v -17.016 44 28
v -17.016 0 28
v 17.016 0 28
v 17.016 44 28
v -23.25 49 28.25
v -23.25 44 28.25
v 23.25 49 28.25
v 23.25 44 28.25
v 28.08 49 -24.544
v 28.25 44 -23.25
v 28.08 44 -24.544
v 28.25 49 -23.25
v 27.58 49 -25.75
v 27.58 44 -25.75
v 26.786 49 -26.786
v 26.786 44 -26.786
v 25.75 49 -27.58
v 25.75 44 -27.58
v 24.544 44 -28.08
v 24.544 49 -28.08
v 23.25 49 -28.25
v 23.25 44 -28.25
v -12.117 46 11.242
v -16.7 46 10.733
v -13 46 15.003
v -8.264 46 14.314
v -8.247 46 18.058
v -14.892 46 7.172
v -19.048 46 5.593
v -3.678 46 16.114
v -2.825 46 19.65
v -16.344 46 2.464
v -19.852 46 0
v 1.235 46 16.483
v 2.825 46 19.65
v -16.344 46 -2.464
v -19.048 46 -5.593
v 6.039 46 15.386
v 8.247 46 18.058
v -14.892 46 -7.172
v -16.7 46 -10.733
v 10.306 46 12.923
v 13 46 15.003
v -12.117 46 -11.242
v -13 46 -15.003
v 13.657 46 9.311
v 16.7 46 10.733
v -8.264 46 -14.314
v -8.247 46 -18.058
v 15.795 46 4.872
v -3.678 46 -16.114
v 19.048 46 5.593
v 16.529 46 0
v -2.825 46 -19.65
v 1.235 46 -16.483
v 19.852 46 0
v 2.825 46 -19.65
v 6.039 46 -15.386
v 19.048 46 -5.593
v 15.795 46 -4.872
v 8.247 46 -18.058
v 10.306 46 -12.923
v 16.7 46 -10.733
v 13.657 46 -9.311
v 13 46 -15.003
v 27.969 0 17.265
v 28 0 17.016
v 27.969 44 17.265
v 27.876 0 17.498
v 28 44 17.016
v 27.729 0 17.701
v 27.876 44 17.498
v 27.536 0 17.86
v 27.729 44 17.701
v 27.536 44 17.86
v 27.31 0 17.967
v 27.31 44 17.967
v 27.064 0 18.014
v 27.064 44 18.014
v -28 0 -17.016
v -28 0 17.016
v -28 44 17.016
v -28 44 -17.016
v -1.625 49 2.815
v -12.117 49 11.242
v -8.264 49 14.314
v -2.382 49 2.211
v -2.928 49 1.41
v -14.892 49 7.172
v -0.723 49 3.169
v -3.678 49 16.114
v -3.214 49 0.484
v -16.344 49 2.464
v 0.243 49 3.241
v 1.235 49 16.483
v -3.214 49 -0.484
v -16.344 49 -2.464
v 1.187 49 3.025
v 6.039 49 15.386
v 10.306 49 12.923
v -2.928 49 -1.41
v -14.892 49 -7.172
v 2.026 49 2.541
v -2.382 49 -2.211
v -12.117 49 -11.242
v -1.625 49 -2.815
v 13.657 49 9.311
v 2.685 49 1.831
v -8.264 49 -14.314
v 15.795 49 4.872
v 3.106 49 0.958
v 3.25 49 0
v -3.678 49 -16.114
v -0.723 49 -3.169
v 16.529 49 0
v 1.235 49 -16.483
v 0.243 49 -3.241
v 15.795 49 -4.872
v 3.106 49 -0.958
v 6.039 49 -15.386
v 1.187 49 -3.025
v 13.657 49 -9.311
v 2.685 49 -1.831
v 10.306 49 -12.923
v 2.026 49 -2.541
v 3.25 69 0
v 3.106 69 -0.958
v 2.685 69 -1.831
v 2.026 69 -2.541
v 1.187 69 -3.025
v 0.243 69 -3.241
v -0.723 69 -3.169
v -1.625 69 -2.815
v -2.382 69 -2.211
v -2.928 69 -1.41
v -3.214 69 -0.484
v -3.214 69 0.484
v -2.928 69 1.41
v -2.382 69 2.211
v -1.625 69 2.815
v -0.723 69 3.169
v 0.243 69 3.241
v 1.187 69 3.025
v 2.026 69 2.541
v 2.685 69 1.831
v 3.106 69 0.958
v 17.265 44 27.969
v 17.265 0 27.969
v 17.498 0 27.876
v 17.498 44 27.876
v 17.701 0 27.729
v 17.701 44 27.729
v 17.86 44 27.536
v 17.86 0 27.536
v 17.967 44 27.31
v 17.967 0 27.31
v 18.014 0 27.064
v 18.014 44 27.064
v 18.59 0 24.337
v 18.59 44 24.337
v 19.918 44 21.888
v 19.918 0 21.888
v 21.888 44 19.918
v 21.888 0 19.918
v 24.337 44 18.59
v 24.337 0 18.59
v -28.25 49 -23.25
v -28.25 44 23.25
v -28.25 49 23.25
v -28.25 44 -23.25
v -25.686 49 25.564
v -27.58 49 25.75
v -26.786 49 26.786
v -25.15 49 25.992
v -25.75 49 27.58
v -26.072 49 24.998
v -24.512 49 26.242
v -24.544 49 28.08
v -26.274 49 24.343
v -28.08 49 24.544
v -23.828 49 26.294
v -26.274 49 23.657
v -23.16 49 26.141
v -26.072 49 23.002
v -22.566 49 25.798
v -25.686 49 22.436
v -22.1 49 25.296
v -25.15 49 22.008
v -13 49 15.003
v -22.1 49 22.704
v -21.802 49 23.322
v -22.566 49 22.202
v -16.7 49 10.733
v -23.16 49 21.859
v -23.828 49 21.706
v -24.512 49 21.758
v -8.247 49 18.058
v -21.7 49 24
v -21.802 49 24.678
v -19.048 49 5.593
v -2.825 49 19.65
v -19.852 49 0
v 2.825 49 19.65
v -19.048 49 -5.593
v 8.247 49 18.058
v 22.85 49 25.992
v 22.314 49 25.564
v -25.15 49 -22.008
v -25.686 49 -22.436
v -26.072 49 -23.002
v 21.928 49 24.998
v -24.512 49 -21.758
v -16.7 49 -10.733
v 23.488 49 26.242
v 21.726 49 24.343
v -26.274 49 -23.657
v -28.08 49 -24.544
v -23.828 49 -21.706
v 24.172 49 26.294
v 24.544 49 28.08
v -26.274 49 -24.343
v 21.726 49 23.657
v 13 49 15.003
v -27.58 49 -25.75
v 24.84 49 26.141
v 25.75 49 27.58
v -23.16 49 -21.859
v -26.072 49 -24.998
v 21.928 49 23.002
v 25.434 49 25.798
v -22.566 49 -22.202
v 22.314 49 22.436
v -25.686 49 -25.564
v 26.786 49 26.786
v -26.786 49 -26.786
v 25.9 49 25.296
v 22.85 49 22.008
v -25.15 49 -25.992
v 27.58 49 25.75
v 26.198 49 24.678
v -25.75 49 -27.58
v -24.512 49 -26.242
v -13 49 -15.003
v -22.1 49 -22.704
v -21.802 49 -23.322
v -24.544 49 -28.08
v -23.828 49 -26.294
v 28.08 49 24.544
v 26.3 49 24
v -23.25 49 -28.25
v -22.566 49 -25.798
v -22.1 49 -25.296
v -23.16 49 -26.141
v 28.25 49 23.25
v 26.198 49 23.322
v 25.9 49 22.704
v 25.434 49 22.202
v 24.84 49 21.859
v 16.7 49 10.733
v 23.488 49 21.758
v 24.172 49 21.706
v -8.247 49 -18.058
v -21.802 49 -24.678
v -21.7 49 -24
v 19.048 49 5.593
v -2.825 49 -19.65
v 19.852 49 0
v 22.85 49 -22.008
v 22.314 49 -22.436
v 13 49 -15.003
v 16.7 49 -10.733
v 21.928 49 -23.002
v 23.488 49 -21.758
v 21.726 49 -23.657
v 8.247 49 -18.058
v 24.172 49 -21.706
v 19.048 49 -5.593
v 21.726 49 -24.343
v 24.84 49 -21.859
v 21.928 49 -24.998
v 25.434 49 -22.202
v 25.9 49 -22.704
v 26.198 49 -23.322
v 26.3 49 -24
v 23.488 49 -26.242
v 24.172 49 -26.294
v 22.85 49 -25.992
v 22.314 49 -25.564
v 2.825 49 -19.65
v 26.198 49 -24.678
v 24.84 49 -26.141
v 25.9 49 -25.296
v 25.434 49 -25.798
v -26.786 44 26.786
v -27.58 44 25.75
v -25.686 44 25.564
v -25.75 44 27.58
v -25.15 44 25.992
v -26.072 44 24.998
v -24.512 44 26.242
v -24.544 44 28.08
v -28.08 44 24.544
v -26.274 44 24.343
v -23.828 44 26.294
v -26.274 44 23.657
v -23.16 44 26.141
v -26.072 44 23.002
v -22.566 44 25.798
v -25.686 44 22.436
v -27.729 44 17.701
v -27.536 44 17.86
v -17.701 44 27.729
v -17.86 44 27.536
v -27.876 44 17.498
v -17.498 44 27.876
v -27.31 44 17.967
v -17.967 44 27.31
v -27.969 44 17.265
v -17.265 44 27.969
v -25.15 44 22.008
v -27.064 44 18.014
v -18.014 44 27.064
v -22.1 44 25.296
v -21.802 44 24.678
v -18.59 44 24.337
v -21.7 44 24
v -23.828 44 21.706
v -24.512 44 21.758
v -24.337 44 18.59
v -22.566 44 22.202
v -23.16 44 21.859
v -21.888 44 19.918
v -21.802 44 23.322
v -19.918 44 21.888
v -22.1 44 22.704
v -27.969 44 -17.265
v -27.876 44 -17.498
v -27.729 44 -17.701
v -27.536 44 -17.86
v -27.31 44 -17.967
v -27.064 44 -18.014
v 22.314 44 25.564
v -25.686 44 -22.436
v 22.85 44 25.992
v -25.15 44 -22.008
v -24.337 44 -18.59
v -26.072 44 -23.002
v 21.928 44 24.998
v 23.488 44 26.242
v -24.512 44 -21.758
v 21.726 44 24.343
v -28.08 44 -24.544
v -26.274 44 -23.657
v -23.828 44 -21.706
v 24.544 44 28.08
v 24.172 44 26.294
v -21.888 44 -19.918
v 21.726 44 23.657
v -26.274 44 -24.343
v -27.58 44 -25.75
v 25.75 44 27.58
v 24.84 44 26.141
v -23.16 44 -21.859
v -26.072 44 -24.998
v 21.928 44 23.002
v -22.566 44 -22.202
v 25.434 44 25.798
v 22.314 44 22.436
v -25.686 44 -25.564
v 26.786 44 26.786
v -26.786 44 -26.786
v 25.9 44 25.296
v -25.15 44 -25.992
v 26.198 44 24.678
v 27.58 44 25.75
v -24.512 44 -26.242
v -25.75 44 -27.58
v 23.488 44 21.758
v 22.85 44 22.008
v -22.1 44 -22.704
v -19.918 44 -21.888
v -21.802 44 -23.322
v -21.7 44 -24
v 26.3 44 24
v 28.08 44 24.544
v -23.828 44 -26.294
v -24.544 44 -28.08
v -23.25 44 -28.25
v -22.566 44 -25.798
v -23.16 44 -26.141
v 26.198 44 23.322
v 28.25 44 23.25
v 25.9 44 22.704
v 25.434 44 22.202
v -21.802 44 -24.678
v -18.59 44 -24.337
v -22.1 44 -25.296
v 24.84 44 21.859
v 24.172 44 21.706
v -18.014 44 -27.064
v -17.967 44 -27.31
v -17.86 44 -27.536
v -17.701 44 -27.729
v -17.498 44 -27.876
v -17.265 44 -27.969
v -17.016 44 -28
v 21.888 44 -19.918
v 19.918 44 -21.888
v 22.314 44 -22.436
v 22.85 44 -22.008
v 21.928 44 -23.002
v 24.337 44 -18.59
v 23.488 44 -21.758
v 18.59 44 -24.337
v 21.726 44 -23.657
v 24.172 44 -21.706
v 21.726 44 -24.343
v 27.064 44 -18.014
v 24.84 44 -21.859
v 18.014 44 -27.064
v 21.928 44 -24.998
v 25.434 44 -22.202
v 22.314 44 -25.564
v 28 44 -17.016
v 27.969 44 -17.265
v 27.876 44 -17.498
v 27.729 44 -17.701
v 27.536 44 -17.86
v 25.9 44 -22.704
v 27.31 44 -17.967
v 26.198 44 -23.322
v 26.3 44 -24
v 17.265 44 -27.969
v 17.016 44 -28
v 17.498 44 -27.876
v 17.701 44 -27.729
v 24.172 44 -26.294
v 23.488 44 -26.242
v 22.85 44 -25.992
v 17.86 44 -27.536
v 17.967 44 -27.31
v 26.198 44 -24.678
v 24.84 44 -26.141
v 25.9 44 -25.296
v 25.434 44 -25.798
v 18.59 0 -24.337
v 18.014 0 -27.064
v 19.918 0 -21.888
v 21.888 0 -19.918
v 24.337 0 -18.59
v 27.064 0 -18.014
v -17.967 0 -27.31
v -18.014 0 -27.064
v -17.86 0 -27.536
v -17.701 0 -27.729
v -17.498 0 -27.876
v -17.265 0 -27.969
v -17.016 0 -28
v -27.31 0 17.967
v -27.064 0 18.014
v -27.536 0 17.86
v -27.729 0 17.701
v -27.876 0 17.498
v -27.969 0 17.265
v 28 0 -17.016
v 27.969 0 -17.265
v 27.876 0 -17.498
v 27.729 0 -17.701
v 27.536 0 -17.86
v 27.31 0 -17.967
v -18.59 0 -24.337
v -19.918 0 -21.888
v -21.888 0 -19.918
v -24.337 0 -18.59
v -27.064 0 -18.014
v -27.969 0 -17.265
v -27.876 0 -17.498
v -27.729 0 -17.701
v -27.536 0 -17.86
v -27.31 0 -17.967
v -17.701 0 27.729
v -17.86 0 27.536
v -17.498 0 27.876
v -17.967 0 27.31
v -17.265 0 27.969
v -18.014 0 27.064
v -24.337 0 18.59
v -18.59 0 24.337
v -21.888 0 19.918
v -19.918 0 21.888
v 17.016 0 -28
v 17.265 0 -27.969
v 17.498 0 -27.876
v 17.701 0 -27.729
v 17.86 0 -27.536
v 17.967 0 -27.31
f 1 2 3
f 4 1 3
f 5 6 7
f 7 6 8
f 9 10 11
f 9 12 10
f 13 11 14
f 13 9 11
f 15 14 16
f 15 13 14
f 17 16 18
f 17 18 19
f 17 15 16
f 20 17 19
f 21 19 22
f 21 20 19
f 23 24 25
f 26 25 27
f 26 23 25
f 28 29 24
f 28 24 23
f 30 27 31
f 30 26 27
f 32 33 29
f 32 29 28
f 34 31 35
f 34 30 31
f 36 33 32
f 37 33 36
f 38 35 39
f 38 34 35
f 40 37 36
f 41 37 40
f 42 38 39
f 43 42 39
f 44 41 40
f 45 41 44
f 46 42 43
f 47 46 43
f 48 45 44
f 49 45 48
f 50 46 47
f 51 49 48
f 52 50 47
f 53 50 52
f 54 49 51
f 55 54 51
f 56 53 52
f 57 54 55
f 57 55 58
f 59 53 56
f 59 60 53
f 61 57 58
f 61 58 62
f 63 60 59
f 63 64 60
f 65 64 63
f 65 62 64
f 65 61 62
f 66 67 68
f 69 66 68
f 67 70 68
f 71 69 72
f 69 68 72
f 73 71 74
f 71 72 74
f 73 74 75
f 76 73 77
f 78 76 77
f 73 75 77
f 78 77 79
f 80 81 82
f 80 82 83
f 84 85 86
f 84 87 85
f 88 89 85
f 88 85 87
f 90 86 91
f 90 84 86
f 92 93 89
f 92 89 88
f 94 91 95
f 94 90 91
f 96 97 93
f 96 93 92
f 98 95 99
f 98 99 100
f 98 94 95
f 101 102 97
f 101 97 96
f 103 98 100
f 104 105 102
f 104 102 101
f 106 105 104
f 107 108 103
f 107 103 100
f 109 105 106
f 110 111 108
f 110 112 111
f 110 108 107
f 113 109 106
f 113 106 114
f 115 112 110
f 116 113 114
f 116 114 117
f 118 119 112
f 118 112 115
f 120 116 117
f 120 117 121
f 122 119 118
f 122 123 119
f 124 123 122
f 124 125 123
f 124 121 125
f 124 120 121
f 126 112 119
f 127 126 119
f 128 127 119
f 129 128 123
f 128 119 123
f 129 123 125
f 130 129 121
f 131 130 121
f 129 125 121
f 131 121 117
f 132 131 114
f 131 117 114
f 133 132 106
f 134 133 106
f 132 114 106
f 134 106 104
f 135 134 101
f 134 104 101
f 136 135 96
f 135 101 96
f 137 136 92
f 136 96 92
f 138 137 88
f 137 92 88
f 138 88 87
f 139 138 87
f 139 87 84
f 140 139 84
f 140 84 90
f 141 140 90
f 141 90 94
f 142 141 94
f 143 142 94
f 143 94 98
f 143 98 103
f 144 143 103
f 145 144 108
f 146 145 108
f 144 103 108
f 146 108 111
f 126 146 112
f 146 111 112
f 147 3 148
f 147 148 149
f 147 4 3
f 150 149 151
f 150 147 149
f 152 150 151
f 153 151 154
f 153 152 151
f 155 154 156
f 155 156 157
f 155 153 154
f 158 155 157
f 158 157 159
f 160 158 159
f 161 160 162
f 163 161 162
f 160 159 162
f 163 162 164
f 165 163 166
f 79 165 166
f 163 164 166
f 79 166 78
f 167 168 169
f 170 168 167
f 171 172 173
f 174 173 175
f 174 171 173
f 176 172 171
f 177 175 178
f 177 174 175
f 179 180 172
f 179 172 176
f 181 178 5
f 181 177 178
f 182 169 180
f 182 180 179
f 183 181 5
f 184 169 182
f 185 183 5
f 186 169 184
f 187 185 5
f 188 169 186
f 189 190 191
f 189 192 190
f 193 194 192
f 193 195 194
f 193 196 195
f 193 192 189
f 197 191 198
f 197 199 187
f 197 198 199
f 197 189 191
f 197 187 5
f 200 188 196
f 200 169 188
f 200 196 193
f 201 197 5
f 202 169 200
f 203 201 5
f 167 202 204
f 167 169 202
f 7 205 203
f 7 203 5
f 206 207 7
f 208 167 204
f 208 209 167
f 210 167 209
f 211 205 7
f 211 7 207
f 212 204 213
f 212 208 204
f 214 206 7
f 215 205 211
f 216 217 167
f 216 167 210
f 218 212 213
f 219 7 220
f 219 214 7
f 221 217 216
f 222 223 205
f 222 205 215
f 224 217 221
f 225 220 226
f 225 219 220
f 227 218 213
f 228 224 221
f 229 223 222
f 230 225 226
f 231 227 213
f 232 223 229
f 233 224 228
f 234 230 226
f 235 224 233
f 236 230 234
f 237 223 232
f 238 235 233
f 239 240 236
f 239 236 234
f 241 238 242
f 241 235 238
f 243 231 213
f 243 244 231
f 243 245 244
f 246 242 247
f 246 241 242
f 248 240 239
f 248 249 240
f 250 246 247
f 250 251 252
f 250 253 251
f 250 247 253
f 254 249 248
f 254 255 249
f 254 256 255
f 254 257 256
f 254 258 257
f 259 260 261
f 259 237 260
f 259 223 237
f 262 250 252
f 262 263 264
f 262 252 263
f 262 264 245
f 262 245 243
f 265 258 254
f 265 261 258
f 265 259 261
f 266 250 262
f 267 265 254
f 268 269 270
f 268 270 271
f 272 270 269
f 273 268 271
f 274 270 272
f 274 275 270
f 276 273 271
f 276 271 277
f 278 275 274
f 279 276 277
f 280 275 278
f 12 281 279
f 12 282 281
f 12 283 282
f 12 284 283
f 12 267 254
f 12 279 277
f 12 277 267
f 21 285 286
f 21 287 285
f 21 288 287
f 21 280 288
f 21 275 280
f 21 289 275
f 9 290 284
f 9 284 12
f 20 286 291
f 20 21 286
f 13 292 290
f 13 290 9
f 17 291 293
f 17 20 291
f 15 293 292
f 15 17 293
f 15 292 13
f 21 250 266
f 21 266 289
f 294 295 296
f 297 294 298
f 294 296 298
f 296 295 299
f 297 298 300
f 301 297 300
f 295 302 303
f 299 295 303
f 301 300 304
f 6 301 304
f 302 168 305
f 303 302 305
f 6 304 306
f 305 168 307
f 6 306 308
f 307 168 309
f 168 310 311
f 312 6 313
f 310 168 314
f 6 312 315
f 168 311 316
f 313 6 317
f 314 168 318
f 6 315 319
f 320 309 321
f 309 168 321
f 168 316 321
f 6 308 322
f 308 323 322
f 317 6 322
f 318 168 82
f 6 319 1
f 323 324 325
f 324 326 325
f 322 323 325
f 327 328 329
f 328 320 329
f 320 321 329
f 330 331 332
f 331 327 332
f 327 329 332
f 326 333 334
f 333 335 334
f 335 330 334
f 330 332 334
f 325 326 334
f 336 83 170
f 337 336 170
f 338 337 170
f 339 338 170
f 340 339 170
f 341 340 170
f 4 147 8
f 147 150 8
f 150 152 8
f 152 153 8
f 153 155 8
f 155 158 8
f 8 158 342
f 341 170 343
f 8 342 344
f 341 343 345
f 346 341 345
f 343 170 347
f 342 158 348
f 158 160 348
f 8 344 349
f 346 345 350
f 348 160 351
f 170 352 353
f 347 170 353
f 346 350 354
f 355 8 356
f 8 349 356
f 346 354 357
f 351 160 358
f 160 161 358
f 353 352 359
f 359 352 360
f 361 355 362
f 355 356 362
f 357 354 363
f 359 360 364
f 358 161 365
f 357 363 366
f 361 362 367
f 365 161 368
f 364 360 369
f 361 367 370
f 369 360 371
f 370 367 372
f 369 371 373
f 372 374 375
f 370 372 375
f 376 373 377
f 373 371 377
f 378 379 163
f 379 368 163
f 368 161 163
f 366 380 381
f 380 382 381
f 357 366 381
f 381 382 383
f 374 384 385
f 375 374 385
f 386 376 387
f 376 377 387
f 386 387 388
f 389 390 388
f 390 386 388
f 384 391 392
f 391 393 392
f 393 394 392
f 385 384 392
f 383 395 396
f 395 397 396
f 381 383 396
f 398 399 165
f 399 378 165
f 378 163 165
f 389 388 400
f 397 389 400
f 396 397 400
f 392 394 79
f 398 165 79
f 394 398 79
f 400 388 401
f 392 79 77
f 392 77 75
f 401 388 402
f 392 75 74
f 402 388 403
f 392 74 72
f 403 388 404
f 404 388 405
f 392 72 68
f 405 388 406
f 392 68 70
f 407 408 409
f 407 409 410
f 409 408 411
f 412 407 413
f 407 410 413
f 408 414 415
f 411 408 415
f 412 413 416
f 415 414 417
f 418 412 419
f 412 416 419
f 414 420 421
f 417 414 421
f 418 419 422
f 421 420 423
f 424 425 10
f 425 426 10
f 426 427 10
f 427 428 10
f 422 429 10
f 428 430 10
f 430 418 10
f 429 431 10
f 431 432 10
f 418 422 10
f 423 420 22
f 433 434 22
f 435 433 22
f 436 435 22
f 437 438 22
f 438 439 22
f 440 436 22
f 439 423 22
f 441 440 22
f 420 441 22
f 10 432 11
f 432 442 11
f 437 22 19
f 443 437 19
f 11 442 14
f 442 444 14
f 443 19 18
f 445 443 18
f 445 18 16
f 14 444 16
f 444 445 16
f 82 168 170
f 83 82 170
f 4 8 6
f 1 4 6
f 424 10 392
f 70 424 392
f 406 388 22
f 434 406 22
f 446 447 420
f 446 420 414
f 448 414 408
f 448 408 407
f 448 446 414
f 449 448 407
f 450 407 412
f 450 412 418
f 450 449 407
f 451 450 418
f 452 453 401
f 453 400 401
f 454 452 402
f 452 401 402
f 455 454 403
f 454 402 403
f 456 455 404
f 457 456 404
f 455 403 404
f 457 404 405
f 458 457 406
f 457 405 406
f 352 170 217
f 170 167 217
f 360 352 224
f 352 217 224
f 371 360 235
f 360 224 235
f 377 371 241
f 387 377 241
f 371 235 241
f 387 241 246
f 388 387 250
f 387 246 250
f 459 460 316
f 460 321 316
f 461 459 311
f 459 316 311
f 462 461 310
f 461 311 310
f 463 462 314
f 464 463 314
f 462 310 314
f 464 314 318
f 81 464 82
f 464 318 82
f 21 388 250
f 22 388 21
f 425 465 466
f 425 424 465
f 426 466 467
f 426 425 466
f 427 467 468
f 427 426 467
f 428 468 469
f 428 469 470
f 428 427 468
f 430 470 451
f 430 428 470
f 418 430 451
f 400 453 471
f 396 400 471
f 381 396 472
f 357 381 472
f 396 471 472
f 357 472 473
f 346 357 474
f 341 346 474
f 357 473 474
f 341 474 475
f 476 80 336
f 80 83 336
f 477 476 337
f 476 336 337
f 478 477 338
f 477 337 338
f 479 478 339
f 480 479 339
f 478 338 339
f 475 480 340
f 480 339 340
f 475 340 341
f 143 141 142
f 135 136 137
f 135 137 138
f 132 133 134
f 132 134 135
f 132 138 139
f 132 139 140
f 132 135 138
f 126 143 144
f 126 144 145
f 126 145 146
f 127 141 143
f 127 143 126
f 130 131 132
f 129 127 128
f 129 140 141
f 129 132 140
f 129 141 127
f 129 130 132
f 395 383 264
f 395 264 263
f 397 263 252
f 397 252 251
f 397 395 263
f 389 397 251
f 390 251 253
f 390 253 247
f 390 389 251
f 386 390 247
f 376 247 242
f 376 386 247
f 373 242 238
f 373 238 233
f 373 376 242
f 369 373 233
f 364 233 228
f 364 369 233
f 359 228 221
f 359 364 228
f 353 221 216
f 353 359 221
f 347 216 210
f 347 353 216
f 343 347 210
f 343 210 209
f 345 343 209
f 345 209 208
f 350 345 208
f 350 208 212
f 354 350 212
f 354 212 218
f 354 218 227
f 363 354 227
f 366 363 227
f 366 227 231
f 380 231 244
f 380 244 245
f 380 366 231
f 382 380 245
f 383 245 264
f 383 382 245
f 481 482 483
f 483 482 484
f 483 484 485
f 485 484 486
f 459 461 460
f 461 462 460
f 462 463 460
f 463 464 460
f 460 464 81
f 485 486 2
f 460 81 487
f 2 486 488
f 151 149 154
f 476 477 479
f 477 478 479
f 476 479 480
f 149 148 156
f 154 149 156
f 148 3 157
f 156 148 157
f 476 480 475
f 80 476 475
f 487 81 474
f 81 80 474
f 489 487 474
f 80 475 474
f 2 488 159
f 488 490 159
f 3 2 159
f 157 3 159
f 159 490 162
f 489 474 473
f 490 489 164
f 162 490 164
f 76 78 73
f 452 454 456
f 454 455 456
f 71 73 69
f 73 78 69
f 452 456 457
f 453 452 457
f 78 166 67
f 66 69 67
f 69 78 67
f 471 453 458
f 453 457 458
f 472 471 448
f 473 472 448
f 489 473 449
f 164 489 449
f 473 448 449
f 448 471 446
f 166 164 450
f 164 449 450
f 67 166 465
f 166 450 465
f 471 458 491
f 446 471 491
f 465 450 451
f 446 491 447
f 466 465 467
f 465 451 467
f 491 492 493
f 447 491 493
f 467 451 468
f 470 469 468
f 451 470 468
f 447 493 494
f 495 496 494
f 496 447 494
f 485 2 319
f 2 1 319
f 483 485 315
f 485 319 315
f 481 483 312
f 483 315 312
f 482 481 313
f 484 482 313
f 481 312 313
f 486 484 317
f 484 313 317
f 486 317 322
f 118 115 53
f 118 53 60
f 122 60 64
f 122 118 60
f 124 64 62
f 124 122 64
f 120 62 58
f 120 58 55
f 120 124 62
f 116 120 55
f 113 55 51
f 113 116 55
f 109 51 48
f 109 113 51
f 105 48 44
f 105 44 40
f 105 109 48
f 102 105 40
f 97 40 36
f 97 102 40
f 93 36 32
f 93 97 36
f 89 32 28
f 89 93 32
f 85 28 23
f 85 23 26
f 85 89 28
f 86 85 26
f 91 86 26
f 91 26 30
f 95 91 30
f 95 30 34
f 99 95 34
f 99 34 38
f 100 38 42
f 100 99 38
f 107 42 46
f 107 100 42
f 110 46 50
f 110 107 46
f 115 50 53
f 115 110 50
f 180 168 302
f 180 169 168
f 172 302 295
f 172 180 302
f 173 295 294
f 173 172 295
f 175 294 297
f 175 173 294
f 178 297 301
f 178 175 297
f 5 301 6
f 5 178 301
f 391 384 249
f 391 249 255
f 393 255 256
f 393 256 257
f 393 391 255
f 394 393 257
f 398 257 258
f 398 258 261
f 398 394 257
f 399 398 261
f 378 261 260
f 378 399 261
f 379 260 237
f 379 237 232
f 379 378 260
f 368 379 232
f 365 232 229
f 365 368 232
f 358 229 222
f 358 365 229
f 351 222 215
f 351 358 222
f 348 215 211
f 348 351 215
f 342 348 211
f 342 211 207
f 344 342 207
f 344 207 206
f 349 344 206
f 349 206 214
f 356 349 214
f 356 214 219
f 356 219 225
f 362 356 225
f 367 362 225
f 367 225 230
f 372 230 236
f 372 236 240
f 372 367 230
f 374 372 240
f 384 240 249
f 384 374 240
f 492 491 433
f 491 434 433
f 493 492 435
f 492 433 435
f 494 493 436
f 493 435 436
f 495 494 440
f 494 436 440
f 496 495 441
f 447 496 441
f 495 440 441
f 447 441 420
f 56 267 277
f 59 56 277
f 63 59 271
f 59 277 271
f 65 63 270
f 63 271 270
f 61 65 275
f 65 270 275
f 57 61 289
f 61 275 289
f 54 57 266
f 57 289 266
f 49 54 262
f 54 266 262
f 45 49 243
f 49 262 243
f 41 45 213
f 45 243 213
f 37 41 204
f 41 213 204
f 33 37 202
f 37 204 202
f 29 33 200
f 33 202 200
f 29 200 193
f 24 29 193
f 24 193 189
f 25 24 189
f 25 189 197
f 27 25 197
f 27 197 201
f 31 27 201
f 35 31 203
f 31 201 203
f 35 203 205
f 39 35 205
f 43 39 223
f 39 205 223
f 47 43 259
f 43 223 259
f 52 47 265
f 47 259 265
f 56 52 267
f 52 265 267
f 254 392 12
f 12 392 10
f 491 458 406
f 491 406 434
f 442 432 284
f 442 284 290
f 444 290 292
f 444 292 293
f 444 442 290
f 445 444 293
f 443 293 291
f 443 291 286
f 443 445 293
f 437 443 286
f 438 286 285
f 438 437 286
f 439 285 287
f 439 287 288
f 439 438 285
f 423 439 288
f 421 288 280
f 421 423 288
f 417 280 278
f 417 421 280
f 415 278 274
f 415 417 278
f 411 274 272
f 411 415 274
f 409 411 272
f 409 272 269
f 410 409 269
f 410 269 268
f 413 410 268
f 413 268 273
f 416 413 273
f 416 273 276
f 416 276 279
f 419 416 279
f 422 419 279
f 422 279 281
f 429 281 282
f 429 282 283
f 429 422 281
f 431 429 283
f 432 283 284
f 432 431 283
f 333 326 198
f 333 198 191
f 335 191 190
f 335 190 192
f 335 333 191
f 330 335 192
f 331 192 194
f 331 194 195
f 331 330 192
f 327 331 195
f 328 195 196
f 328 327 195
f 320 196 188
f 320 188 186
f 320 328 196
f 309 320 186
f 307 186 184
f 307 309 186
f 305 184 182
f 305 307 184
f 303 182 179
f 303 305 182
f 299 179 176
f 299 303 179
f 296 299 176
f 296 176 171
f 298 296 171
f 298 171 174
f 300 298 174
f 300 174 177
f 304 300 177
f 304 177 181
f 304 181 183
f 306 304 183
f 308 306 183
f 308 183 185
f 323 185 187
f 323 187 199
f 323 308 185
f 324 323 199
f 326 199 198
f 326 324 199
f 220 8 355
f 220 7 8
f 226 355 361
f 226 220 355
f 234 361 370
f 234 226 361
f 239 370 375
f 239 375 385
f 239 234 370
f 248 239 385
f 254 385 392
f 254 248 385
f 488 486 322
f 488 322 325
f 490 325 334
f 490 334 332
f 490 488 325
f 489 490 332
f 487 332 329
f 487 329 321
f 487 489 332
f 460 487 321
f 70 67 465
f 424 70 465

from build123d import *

# Parameters (mm, degrees)
SKETCH1_W                                = 56
SKETCH1_H                                = 56
BOSS_EXTRUDE1_DEPTH                      = 44
SKETCH2_W                                = 56.5
SKETCH2_H                                = 56.5
SKETCH2_R                                = 2.3
BOSS_EXTRUDE2_DEPTH                      = 5
SKETCH3_R                                = 19.851731711
SKETCH3_R_2                              = 16.528882373
CUT_EXTRUDE1_DEPTH                       = 3
SKETCH4_R                                = 3.25
BOSS_EXTRUDE3_DEPTH                      = 20
CUT_EXTRUDE2_DEPTH                       = 44
MIRROR1_AT_THE_SECOND_PLANE_COPY_1_DEPTH = 44
FILLET3_R                                = 1
FILLET2_R                                = 5


with BuildPart() as part:
    # Sketch1 → Boss-Extrude1 (new body)
    with BuildSketch(Plane(origin=(0, 0, 0), x_dir=(1, 0, 0), z_dir=(0, 1, 0))):
        Rectangle(SKETCH1_W, SKETCH1_H)
    extrude(amount=BOSS_EXTRUDE1_DEPTH)

    # Sketch2 → Boss-Extrude2 (add)
    with BuildSketch(Plane(origin=(0, 44, 0), x_dir=(1, 0, 0), z_dir=(0, 1, 0))):
        Rectangle(SKETCH2_W, SKETCH2_H)
        with Locations((-24, 24)):
            Circle(SKETCH2_R, mode=Mode.SUBTRACT)
        with Locations((24, 24)):
            Circle(SKETCH2_R, mode=Mode.SUBTRACT)
        with Locations((-24, -24)):
            Circle(SKETCH2_R, mode=Mode.SUBTRACT)
        with Locations((24, -24)):
            Circle(SKETCH2_R, mode=Mode.SUBTRACT)
    extrude(amount=BOSS_EXTRUDE2_DEPTH)

    # Sketch3 → Cut-Extrude1 (cut)
    with BuildSketch(Plane(origin=(0, 49, 0), x_dir=(1, 0, 0), z_dir=(0, 1, 0))):
        Circle(SKETCH3_R)
        Circle(SKETCH3_R_2, mode=Mode.SUBTRACT)
    extrude(amount=-CUT_EXTRUDE1_DEPTH, mode=Mode.SUBTRACT)

    # Sketch4 → Boss-Extrude3 (add)
    with BuildSketch(Plane(origin=(0, 49, 0), x_dir=(1, 0, 0), z_dir=(0, 1, 0))):
        Circle(SKETCH4_R)
    extrude(amount=BOSS_EXTRUDE3_DEPTH)

    # Sketch5 → Cut-Extrude2 (cut)
    with BuildSketch(Plane.XZ):
        with BuildLine():
            Line((-28, 18), (-28, 28))
            Line((-28, 28), (-18, 28))
            ThreePointArc((-18, 28), (-20.83143897, 20.83143897), (-28, 18))
        make_face()
    cut_extrude2 = extrude(amount=-CUT_EXTRUDE2_DEPTH, mode=Mode.SUBTRACT)

    # Mirror1: Cut-Extrude2 across plane
    add(cut_extrude2.mirror(Plane(origin=(0, 0, 0), x_dir=(0, 0, 1), z_dir=(1, 0, 0))), mode=Mode.SUBTRACT)

    # Mirror1 at the second plane: Cut-Extrude2 across plane
    add(cut_extrude2.mirror(Plane.XY), mode=Mode.SUBTRACT)

    # Mirror1 at the second plane copy 1 sketc → Mirror1 at the second plane copy 1 (cut)
    with BuildSketch(Plane(origin=(0, 0, 0), x_dir=(-1, 0, 0), z_dir=(0, -1, 0))):
        with BuildLine():
            Line((-28, 18), (-28, 28))
            Line((-28, 28), (-18, 28))
            ThreePointArc((-18, 28), (-20.83143897, 20.83143897), (-28, 18))
        make_face()
    extrude(amount=-MIRROR1_AT_THE_SECOND_PLANE_COPY_1_DEPTH, mode=Mode.SUBTRACT)

    # Fillet3
    fillet3_edges = [part.edges().sort_by_distance(p)[0] for p in [
        (-18, 22, 28),
        (-28, 22, 18),
        (-28, 22, -18),
        (-18, 22, -28),
        (28, 22, 18),
        (18, 22, 28),
        (18, 22, -28),
        (28, 22, -18),
    ]]
    fillet(fillet3_edges, radius=FILLET3_R)

    # Fillet2
    fillet2_edges = [part.edges().sort_by_distance(p)[0] for p in [
        (28.25, 46.5, 28.25),
        (28.25, 46.5, -28.25),
        (-28.25, 46.5, -28.25),
        (-28.25, 46.5, 28.25),
    ]]
    fillet(fillet2_edges, radius=FILLET2_R)


solid = part.part
